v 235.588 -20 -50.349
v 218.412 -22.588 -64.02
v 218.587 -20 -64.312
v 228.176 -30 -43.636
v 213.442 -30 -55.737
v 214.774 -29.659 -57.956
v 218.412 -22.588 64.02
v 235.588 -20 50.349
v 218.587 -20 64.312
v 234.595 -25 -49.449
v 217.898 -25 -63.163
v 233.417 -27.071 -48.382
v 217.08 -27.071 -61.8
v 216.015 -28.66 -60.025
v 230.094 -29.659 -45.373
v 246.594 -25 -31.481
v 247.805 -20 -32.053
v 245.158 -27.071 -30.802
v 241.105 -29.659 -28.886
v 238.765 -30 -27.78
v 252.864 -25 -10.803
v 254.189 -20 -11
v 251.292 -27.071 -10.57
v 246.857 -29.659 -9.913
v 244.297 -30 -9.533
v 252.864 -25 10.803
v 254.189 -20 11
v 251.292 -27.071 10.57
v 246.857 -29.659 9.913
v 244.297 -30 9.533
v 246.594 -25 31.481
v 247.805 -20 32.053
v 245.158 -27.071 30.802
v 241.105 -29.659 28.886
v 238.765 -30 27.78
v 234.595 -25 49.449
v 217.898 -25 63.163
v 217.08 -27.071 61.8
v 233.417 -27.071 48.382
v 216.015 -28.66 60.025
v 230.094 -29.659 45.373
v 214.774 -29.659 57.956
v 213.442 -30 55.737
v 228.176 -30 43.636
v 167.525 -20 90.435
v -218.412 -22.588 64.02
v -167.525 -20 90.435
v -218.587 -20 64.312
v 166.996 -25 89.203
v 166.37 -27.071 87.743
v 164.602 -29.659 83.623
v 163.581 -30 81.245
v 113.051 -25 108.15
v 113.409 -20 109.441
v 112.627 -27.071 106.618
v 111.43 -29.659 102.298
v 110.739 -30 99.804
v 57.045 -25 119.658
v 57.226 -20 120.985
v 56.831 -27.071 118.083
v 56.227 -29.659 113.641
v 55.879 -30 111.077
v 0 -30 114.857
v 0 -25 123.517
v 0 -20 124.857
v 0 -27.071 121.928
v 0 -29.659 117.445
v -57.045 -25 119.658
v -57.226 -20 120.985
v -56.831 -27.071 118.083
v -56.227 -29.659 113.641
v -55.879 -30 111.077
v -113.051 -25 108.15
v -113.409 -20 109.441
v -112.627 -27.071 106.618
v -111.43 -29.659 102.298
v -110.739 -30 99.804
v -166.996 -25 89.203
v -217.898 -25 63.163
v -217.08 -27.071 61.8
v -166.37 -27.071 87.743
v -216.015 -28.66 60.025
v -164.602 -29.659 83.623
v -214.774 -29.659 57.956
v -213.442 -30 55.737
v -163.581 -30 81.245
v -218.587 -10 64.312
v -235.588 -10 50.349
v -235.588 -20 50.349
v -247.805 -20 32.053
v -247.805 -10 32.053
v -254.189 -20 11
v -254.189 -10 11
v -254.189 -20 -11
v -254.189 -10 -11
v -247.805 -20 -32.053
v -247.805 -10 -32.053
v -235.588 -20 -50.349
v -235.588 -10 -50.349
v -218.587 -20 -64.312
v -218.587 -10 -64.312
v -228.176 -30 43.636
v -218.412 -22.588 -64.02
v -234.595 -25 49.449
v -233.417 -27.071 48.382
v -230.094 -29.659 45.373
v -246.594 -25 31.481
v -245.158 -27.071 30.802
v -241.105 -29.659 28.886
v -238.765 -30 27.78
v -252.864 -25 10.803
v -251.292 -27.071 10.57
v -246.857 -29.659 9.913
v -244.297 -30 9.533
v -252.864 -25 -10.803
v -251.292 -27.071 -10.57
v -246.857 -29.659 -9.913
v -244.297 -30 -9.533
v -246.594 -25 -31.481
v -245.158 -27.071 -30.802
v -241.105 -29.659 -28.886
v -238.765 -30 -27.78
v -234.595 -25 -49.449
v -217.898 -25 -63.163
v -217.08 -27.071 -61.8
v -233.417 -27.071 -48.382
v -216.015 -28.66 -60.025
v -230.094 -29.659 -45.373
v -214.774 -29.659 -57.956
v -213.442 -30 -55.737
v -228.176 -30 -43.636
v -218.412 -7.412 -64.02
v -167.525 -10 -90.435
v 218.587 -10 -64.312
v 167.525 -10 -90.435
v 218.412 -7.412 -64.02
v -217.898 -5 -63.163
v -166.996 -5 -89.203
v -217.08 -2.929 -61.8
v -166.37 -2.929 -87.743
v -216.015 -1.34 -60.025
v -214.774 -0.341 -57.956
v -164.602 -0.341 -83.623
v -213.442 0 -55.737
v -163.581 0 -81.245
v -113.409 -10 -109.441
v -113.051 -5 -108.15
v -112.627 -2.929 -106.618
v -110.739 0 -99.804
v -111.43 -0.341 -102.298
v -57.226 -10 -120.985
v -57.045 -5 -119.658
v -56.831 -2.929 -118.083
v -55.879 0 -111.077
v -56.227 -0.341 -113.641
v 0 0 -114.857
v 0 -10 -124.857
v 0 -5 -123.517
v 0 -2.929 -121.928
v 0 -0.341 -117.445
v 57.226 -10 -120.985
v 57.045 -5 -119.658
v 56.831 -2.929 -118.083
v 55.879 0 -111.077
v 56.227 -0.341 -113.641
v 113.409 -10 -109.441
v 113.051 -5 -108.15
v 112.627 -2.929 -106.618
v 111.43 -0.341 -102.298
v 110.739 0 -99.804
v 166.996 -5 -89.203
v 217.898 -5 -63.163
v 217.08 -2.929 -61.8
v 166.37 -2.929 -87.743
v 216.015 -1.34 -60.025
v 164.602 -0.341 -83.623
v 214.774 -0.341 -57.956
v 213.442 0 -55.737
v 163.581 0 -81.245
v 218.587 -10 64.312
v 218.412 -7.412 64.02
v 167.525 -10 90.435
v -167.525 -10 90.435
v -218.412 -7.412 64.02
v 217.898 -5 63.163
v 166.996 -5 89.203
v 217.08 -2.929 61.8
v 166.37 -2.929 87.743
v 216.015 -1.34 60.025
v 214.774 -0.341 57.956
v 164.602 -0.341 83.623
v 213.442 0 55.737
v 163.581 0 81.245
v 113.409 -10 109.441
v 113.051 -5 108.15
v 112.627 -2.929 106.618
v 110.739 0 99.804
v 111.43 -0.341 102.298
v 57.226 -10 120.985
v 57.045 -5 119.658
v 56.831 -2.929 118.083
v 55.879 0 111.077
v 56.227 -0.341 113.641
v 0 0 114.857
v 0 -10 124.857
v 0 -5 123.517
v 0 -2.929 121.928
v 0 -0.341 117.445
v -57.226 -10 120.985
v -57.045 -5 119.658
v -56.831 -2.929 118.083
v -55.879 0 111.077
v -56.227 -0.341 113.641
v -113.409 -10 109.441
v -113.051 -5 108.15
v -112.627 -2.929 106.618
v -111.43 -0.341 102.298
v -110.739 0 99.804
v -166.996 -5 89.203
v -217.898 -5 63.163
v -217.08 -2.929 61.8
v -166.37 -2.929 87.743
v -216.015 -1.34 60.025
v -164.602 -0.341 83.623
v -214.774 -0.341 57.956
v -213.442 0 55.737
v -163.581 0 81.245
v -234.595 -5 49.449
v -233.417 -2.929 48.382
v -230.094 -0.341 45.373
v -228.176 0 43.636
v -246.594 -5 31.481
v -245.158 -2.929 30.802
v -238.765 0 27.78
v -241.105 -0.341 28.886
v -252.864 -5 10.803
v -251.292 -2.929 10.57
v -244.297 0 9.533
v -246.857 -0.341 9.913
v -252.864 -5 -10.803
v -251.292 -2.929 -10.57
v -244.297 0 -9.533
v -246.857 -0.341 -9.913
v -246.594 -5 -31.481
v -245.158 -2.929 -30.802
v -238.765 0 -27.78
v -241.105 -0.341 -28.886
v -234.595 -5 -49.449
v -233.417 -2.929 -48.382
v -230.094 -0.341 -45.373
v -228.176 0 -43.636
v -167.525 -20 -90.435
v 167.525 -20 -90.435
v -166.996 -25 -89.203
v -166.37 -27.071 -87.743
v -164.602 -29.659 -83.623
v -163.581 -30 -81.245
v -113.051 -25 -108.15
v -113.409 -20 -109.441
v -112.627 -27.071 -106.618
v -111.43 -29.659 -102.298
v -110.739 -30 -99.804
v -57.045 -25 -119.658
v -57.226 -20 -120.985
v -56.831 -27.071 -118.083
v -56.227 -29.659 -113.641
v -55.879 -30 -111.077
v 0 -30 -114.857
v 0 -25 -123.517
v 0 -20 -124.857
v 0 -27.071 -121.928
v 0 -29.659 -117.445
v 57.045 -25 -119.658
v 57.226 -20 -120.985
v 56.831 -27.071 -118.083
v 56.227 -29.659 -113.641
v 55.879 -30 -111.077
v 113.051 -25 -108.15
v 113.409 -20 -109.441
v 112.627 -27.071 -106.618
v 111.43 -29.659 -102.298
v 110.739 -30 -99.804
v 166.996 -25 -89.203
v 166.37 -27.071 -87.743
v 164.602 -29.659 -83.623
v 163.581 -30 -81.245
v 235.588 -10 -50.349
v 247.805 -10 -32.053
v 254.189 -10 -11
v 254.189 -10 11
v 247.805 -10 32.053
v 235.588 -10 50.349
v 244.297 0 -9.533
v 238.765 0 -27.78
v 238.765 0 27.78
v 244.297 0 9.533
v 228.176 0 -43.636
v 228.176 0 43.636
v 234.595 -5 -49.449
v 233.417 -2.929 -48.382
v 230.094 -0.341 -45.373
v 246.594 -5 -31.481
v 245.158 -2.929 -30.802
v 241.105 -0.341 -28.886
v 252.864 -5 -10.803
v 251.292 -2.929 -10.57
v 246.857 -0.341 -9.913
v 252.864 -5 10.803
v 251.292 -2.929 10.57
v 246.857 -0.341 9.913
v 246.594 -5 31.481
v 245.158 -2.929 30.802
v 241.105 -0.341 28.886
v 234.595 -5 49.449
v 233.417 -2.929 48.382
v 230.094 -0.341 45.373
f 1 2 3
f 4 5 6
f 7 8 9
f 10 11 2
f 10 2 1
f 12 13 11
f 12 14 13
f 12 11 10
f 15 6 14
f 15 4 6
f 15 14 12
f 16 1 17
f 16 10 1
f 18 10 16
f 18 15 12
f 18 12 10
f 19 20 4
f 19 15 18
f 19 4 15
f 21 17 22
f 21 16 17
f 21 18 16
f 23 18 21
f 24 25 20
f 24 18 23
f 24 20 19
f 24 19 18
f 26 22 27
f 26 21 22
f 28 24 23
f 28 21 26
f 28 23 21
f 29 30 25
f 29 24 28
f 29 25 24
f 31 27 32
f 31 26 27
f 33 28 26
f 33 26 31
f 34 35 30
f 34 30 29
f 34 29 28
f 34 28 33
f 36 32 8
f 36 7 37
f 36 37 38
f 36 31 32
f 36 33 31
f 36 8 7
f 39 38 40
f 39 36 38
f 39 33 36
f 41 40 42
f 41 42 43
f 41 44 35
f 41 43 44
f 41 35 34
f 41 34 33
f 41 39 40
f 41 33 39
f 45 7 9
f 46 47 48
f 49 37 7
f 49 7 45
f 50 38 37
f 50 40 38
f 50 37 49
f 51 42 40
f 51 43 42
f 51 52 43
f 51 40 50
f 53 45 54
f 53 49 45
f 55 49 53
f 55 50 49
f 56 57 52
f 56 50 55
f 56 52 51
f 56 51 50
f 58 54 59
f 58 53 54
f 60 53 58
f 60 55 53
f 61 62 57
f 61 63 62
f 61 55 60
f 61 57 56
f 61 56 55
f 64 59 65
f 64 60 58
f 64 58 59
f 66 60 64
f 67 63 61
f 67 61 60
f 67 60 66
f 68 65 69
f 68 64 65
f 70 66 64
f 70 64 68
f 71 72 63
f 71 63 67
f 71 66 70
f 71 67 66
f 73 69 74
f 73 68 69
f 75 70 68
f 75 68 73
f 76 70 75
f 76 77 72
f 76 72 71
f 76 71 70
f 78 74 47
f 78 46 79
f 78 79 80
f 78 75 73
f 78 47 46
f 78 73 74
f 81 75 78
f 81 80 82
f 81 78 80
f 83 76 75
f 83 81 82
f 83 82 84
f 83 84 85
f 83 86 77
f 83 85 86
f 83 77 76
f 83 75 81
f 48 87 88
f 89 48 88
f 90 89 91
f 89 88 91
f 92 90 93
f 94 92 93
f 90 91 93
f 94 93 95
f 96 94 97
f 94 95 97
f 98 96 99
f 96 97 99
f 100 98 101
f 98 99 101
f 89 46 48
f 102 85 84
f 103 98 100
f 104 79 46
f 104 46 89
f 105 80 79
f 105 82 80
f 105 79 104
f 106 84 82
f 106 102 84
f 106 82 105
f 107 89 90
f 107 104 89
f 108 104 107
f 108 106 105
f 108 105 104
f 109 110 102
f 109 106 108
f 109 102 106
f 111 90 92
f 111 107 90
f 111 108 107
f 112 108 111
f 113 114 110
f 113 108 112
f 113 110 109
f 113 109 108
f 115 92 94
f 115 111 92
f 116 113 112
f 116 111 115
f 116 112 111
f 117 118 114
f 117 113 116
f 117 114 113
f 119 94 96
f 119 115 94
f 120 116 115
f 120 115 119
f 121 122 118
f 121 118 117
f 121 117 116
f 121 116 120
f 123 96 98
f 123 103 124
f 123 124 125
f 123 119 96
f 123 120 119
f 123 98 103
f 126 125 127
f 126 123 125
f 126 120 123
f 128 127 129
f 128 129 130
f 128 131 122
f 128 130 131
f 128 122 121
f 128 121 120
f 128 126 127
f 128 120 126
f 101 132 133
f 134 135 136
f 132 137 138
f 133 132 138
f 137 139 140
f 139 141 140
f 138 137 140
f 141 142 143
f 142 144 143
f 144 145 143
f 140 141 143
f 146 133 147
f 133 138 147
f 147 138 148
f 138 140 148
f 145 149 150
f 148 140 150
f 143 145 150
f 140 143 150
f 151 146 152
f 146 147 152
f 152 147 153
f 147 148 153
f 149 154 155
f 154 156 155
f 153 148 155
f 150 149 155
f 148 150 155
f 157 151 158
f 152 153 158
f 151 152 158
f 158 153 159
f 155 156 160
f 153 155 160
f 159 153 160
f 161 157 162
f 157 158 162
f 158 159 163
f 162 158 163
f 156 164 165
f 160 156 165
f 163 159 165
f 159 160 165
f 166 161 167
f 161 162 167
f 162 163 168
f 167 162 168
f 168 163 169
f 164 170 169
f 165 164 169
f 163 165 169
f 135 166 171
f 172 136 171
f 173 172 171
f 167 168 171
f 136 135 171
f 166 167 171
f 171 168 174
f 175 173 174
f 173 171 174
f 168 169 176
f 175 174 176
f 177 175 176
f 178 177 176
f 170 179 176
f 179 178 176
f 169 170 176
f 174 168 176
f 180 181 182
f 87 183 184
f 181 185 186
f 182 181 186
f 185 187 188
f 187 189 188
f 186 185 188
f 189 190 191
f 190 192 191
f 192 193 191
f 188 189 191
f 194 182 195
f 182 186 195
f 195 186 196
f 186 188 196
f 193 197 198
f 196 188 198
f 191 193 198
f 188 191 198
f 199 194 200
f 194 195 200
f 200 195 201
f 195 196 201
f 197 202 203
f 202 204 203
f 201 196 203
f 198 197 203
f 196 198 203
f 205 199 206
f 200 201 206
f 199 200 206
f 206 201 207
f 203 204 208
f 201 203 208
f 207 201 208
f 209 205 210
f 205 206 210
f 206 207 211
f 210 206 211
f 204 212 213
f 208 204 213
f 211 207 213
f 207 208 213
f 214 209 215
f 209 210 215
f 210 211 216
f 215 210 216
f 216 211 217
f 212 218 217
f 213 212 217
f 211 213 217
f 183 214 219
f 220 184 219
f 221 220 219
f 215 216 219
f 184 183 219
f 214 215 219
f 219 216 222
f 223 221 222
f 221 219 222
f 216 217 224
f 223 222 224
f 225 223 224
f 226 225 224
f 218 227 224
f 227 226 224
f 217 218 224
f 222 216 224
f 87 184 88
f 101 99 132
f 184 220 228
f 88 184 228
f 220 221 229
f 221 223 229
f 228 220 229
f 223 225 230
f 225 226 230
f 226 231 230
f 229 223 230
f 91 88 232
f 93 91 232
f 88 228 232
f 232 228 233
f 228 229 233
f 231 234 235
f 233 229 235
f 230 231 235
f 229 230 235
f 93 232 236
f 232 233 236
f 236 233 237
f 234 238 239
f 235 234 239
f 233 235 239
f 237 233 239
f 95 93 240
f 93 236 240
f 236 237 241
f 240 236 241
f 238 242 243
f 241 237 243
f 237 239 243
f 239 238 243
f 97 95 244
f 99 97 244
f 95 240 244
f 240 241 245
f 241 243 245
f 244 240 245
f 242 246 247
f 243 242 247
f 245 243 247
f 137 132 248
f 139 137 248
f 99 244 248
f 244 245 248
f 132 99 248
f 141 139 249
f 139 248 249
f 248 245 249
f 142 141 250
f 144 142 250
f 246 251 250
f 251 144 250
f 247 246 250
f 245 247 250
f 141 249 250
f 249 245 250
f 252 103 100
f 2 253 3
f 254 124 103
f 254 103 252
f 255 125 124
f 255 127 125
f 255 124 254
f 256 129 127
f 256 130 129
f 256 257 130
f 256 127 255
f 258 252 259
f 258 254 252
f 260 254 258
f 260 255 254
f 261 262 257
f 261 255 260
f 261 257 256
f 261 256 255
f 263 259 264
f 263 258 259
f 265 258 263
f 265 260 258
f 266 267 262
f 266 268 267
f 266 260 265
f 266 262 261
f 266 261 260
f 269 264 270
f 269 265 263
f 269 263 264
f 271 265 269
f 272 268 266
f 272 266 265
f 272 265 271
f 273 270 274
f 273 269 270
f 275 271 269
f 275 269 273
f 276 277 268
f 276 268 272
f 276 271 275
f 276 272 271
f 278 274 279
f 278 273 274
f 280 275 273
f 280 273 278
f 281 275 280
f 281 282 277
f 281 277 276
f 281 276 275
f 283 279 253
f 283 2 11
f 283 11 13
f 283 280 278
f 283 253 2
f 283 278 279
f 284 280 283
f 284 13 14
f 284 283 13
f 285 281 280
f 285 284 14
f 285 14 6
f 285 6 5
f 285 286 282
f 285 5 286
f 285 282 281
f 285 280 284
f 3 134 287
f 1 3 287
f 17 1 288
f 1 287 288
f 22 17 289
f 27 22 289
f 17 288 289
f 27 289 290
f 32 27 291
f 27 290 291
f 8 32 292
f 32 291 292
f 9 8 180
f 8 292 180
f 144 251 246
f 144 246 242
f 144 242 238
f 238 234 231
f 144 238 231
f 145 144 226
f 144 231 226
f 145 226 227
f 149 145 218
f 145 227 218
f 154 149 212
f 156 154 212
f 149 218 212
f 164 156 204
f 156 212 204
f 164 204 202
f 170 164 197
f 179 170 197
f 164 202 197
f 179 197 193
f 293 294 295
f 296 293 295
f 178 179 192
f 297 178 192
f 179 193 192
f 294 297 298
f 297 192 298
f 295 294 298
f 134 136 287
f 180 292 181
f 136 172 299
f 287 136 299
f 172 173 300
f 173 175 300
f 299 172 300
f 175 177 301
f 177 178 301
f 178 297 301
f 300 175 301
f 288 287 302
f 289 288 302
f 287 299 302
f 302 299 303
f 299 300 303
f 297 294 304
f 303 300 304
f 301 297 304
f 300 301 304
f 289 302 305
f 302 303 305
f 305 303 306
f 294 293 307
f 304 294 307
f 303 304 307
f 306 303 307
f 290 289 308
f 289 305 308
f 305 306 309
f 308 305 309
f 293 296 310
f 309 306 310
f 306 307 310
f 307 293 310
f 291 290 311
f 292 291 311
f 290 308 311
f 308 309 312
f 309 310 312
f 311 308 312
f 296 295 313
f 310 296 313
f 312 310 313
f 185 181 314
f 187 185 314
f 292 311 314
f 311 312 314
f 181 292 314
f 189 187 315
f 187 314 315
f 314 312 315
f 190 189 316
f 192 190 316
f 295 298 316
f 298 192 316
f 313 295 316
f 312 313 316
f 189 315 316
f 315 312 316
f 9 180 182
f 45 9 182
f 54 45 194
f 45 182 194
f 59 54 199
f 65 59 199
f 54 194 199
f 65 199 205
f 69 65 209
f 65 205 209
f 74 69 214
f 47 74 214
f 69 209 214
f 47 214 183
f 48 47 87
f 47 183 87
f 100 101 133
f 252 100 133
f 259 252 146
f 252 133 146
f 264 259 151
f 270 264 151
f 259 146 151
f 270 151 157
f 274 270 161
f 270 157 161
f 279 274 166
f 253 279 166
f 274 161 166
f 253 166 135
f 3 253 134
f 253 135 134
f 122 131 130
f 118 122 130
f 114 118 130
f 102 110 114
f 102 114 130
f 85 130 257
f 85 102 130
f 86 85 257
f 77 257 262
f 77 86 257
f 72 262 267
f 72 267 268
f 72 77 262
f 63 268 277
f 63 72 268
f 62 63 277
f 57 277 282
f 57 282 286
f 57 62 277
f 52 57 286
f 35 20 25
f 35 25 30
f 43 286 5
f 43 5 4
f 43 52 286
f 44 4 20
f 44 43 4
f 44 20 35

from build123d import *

# Parameters (mm, degrees)
F1_DEPTH = 30
F2_R     = 10


with BuildPart() as f1:
    # F0 (on Front) → F1 (new body)
    with BuildSketch(Plane.XZ):
        with BuildLine():
            ThreePointArc((218.587182, 64.311969), (0, 124.857114), (-218.587182, 64.311969))
            ThreePointArc((-218.587182, 64.311969), (-255, 0), (-218.587182, -64.311969))
            ThreePointArc((-218.587182, -64.311969), (0, -124.857114), (218.587182, -64.311969))
            ThreePointArc((218.587182, -64.311969), (255, 0), (218.587182, 64.311969))
        make_face()
    extrude(amount=F1_DEPTH)

    # F2
    f2_edges = [f1.edges().sort_by_distance(p)[0] for p in [
        (0, -30, -124.857114),
        (0, 0, -124.857114),
    ]]
    fillet(f2_edges, radius=F2_R)


solid = f1.part
